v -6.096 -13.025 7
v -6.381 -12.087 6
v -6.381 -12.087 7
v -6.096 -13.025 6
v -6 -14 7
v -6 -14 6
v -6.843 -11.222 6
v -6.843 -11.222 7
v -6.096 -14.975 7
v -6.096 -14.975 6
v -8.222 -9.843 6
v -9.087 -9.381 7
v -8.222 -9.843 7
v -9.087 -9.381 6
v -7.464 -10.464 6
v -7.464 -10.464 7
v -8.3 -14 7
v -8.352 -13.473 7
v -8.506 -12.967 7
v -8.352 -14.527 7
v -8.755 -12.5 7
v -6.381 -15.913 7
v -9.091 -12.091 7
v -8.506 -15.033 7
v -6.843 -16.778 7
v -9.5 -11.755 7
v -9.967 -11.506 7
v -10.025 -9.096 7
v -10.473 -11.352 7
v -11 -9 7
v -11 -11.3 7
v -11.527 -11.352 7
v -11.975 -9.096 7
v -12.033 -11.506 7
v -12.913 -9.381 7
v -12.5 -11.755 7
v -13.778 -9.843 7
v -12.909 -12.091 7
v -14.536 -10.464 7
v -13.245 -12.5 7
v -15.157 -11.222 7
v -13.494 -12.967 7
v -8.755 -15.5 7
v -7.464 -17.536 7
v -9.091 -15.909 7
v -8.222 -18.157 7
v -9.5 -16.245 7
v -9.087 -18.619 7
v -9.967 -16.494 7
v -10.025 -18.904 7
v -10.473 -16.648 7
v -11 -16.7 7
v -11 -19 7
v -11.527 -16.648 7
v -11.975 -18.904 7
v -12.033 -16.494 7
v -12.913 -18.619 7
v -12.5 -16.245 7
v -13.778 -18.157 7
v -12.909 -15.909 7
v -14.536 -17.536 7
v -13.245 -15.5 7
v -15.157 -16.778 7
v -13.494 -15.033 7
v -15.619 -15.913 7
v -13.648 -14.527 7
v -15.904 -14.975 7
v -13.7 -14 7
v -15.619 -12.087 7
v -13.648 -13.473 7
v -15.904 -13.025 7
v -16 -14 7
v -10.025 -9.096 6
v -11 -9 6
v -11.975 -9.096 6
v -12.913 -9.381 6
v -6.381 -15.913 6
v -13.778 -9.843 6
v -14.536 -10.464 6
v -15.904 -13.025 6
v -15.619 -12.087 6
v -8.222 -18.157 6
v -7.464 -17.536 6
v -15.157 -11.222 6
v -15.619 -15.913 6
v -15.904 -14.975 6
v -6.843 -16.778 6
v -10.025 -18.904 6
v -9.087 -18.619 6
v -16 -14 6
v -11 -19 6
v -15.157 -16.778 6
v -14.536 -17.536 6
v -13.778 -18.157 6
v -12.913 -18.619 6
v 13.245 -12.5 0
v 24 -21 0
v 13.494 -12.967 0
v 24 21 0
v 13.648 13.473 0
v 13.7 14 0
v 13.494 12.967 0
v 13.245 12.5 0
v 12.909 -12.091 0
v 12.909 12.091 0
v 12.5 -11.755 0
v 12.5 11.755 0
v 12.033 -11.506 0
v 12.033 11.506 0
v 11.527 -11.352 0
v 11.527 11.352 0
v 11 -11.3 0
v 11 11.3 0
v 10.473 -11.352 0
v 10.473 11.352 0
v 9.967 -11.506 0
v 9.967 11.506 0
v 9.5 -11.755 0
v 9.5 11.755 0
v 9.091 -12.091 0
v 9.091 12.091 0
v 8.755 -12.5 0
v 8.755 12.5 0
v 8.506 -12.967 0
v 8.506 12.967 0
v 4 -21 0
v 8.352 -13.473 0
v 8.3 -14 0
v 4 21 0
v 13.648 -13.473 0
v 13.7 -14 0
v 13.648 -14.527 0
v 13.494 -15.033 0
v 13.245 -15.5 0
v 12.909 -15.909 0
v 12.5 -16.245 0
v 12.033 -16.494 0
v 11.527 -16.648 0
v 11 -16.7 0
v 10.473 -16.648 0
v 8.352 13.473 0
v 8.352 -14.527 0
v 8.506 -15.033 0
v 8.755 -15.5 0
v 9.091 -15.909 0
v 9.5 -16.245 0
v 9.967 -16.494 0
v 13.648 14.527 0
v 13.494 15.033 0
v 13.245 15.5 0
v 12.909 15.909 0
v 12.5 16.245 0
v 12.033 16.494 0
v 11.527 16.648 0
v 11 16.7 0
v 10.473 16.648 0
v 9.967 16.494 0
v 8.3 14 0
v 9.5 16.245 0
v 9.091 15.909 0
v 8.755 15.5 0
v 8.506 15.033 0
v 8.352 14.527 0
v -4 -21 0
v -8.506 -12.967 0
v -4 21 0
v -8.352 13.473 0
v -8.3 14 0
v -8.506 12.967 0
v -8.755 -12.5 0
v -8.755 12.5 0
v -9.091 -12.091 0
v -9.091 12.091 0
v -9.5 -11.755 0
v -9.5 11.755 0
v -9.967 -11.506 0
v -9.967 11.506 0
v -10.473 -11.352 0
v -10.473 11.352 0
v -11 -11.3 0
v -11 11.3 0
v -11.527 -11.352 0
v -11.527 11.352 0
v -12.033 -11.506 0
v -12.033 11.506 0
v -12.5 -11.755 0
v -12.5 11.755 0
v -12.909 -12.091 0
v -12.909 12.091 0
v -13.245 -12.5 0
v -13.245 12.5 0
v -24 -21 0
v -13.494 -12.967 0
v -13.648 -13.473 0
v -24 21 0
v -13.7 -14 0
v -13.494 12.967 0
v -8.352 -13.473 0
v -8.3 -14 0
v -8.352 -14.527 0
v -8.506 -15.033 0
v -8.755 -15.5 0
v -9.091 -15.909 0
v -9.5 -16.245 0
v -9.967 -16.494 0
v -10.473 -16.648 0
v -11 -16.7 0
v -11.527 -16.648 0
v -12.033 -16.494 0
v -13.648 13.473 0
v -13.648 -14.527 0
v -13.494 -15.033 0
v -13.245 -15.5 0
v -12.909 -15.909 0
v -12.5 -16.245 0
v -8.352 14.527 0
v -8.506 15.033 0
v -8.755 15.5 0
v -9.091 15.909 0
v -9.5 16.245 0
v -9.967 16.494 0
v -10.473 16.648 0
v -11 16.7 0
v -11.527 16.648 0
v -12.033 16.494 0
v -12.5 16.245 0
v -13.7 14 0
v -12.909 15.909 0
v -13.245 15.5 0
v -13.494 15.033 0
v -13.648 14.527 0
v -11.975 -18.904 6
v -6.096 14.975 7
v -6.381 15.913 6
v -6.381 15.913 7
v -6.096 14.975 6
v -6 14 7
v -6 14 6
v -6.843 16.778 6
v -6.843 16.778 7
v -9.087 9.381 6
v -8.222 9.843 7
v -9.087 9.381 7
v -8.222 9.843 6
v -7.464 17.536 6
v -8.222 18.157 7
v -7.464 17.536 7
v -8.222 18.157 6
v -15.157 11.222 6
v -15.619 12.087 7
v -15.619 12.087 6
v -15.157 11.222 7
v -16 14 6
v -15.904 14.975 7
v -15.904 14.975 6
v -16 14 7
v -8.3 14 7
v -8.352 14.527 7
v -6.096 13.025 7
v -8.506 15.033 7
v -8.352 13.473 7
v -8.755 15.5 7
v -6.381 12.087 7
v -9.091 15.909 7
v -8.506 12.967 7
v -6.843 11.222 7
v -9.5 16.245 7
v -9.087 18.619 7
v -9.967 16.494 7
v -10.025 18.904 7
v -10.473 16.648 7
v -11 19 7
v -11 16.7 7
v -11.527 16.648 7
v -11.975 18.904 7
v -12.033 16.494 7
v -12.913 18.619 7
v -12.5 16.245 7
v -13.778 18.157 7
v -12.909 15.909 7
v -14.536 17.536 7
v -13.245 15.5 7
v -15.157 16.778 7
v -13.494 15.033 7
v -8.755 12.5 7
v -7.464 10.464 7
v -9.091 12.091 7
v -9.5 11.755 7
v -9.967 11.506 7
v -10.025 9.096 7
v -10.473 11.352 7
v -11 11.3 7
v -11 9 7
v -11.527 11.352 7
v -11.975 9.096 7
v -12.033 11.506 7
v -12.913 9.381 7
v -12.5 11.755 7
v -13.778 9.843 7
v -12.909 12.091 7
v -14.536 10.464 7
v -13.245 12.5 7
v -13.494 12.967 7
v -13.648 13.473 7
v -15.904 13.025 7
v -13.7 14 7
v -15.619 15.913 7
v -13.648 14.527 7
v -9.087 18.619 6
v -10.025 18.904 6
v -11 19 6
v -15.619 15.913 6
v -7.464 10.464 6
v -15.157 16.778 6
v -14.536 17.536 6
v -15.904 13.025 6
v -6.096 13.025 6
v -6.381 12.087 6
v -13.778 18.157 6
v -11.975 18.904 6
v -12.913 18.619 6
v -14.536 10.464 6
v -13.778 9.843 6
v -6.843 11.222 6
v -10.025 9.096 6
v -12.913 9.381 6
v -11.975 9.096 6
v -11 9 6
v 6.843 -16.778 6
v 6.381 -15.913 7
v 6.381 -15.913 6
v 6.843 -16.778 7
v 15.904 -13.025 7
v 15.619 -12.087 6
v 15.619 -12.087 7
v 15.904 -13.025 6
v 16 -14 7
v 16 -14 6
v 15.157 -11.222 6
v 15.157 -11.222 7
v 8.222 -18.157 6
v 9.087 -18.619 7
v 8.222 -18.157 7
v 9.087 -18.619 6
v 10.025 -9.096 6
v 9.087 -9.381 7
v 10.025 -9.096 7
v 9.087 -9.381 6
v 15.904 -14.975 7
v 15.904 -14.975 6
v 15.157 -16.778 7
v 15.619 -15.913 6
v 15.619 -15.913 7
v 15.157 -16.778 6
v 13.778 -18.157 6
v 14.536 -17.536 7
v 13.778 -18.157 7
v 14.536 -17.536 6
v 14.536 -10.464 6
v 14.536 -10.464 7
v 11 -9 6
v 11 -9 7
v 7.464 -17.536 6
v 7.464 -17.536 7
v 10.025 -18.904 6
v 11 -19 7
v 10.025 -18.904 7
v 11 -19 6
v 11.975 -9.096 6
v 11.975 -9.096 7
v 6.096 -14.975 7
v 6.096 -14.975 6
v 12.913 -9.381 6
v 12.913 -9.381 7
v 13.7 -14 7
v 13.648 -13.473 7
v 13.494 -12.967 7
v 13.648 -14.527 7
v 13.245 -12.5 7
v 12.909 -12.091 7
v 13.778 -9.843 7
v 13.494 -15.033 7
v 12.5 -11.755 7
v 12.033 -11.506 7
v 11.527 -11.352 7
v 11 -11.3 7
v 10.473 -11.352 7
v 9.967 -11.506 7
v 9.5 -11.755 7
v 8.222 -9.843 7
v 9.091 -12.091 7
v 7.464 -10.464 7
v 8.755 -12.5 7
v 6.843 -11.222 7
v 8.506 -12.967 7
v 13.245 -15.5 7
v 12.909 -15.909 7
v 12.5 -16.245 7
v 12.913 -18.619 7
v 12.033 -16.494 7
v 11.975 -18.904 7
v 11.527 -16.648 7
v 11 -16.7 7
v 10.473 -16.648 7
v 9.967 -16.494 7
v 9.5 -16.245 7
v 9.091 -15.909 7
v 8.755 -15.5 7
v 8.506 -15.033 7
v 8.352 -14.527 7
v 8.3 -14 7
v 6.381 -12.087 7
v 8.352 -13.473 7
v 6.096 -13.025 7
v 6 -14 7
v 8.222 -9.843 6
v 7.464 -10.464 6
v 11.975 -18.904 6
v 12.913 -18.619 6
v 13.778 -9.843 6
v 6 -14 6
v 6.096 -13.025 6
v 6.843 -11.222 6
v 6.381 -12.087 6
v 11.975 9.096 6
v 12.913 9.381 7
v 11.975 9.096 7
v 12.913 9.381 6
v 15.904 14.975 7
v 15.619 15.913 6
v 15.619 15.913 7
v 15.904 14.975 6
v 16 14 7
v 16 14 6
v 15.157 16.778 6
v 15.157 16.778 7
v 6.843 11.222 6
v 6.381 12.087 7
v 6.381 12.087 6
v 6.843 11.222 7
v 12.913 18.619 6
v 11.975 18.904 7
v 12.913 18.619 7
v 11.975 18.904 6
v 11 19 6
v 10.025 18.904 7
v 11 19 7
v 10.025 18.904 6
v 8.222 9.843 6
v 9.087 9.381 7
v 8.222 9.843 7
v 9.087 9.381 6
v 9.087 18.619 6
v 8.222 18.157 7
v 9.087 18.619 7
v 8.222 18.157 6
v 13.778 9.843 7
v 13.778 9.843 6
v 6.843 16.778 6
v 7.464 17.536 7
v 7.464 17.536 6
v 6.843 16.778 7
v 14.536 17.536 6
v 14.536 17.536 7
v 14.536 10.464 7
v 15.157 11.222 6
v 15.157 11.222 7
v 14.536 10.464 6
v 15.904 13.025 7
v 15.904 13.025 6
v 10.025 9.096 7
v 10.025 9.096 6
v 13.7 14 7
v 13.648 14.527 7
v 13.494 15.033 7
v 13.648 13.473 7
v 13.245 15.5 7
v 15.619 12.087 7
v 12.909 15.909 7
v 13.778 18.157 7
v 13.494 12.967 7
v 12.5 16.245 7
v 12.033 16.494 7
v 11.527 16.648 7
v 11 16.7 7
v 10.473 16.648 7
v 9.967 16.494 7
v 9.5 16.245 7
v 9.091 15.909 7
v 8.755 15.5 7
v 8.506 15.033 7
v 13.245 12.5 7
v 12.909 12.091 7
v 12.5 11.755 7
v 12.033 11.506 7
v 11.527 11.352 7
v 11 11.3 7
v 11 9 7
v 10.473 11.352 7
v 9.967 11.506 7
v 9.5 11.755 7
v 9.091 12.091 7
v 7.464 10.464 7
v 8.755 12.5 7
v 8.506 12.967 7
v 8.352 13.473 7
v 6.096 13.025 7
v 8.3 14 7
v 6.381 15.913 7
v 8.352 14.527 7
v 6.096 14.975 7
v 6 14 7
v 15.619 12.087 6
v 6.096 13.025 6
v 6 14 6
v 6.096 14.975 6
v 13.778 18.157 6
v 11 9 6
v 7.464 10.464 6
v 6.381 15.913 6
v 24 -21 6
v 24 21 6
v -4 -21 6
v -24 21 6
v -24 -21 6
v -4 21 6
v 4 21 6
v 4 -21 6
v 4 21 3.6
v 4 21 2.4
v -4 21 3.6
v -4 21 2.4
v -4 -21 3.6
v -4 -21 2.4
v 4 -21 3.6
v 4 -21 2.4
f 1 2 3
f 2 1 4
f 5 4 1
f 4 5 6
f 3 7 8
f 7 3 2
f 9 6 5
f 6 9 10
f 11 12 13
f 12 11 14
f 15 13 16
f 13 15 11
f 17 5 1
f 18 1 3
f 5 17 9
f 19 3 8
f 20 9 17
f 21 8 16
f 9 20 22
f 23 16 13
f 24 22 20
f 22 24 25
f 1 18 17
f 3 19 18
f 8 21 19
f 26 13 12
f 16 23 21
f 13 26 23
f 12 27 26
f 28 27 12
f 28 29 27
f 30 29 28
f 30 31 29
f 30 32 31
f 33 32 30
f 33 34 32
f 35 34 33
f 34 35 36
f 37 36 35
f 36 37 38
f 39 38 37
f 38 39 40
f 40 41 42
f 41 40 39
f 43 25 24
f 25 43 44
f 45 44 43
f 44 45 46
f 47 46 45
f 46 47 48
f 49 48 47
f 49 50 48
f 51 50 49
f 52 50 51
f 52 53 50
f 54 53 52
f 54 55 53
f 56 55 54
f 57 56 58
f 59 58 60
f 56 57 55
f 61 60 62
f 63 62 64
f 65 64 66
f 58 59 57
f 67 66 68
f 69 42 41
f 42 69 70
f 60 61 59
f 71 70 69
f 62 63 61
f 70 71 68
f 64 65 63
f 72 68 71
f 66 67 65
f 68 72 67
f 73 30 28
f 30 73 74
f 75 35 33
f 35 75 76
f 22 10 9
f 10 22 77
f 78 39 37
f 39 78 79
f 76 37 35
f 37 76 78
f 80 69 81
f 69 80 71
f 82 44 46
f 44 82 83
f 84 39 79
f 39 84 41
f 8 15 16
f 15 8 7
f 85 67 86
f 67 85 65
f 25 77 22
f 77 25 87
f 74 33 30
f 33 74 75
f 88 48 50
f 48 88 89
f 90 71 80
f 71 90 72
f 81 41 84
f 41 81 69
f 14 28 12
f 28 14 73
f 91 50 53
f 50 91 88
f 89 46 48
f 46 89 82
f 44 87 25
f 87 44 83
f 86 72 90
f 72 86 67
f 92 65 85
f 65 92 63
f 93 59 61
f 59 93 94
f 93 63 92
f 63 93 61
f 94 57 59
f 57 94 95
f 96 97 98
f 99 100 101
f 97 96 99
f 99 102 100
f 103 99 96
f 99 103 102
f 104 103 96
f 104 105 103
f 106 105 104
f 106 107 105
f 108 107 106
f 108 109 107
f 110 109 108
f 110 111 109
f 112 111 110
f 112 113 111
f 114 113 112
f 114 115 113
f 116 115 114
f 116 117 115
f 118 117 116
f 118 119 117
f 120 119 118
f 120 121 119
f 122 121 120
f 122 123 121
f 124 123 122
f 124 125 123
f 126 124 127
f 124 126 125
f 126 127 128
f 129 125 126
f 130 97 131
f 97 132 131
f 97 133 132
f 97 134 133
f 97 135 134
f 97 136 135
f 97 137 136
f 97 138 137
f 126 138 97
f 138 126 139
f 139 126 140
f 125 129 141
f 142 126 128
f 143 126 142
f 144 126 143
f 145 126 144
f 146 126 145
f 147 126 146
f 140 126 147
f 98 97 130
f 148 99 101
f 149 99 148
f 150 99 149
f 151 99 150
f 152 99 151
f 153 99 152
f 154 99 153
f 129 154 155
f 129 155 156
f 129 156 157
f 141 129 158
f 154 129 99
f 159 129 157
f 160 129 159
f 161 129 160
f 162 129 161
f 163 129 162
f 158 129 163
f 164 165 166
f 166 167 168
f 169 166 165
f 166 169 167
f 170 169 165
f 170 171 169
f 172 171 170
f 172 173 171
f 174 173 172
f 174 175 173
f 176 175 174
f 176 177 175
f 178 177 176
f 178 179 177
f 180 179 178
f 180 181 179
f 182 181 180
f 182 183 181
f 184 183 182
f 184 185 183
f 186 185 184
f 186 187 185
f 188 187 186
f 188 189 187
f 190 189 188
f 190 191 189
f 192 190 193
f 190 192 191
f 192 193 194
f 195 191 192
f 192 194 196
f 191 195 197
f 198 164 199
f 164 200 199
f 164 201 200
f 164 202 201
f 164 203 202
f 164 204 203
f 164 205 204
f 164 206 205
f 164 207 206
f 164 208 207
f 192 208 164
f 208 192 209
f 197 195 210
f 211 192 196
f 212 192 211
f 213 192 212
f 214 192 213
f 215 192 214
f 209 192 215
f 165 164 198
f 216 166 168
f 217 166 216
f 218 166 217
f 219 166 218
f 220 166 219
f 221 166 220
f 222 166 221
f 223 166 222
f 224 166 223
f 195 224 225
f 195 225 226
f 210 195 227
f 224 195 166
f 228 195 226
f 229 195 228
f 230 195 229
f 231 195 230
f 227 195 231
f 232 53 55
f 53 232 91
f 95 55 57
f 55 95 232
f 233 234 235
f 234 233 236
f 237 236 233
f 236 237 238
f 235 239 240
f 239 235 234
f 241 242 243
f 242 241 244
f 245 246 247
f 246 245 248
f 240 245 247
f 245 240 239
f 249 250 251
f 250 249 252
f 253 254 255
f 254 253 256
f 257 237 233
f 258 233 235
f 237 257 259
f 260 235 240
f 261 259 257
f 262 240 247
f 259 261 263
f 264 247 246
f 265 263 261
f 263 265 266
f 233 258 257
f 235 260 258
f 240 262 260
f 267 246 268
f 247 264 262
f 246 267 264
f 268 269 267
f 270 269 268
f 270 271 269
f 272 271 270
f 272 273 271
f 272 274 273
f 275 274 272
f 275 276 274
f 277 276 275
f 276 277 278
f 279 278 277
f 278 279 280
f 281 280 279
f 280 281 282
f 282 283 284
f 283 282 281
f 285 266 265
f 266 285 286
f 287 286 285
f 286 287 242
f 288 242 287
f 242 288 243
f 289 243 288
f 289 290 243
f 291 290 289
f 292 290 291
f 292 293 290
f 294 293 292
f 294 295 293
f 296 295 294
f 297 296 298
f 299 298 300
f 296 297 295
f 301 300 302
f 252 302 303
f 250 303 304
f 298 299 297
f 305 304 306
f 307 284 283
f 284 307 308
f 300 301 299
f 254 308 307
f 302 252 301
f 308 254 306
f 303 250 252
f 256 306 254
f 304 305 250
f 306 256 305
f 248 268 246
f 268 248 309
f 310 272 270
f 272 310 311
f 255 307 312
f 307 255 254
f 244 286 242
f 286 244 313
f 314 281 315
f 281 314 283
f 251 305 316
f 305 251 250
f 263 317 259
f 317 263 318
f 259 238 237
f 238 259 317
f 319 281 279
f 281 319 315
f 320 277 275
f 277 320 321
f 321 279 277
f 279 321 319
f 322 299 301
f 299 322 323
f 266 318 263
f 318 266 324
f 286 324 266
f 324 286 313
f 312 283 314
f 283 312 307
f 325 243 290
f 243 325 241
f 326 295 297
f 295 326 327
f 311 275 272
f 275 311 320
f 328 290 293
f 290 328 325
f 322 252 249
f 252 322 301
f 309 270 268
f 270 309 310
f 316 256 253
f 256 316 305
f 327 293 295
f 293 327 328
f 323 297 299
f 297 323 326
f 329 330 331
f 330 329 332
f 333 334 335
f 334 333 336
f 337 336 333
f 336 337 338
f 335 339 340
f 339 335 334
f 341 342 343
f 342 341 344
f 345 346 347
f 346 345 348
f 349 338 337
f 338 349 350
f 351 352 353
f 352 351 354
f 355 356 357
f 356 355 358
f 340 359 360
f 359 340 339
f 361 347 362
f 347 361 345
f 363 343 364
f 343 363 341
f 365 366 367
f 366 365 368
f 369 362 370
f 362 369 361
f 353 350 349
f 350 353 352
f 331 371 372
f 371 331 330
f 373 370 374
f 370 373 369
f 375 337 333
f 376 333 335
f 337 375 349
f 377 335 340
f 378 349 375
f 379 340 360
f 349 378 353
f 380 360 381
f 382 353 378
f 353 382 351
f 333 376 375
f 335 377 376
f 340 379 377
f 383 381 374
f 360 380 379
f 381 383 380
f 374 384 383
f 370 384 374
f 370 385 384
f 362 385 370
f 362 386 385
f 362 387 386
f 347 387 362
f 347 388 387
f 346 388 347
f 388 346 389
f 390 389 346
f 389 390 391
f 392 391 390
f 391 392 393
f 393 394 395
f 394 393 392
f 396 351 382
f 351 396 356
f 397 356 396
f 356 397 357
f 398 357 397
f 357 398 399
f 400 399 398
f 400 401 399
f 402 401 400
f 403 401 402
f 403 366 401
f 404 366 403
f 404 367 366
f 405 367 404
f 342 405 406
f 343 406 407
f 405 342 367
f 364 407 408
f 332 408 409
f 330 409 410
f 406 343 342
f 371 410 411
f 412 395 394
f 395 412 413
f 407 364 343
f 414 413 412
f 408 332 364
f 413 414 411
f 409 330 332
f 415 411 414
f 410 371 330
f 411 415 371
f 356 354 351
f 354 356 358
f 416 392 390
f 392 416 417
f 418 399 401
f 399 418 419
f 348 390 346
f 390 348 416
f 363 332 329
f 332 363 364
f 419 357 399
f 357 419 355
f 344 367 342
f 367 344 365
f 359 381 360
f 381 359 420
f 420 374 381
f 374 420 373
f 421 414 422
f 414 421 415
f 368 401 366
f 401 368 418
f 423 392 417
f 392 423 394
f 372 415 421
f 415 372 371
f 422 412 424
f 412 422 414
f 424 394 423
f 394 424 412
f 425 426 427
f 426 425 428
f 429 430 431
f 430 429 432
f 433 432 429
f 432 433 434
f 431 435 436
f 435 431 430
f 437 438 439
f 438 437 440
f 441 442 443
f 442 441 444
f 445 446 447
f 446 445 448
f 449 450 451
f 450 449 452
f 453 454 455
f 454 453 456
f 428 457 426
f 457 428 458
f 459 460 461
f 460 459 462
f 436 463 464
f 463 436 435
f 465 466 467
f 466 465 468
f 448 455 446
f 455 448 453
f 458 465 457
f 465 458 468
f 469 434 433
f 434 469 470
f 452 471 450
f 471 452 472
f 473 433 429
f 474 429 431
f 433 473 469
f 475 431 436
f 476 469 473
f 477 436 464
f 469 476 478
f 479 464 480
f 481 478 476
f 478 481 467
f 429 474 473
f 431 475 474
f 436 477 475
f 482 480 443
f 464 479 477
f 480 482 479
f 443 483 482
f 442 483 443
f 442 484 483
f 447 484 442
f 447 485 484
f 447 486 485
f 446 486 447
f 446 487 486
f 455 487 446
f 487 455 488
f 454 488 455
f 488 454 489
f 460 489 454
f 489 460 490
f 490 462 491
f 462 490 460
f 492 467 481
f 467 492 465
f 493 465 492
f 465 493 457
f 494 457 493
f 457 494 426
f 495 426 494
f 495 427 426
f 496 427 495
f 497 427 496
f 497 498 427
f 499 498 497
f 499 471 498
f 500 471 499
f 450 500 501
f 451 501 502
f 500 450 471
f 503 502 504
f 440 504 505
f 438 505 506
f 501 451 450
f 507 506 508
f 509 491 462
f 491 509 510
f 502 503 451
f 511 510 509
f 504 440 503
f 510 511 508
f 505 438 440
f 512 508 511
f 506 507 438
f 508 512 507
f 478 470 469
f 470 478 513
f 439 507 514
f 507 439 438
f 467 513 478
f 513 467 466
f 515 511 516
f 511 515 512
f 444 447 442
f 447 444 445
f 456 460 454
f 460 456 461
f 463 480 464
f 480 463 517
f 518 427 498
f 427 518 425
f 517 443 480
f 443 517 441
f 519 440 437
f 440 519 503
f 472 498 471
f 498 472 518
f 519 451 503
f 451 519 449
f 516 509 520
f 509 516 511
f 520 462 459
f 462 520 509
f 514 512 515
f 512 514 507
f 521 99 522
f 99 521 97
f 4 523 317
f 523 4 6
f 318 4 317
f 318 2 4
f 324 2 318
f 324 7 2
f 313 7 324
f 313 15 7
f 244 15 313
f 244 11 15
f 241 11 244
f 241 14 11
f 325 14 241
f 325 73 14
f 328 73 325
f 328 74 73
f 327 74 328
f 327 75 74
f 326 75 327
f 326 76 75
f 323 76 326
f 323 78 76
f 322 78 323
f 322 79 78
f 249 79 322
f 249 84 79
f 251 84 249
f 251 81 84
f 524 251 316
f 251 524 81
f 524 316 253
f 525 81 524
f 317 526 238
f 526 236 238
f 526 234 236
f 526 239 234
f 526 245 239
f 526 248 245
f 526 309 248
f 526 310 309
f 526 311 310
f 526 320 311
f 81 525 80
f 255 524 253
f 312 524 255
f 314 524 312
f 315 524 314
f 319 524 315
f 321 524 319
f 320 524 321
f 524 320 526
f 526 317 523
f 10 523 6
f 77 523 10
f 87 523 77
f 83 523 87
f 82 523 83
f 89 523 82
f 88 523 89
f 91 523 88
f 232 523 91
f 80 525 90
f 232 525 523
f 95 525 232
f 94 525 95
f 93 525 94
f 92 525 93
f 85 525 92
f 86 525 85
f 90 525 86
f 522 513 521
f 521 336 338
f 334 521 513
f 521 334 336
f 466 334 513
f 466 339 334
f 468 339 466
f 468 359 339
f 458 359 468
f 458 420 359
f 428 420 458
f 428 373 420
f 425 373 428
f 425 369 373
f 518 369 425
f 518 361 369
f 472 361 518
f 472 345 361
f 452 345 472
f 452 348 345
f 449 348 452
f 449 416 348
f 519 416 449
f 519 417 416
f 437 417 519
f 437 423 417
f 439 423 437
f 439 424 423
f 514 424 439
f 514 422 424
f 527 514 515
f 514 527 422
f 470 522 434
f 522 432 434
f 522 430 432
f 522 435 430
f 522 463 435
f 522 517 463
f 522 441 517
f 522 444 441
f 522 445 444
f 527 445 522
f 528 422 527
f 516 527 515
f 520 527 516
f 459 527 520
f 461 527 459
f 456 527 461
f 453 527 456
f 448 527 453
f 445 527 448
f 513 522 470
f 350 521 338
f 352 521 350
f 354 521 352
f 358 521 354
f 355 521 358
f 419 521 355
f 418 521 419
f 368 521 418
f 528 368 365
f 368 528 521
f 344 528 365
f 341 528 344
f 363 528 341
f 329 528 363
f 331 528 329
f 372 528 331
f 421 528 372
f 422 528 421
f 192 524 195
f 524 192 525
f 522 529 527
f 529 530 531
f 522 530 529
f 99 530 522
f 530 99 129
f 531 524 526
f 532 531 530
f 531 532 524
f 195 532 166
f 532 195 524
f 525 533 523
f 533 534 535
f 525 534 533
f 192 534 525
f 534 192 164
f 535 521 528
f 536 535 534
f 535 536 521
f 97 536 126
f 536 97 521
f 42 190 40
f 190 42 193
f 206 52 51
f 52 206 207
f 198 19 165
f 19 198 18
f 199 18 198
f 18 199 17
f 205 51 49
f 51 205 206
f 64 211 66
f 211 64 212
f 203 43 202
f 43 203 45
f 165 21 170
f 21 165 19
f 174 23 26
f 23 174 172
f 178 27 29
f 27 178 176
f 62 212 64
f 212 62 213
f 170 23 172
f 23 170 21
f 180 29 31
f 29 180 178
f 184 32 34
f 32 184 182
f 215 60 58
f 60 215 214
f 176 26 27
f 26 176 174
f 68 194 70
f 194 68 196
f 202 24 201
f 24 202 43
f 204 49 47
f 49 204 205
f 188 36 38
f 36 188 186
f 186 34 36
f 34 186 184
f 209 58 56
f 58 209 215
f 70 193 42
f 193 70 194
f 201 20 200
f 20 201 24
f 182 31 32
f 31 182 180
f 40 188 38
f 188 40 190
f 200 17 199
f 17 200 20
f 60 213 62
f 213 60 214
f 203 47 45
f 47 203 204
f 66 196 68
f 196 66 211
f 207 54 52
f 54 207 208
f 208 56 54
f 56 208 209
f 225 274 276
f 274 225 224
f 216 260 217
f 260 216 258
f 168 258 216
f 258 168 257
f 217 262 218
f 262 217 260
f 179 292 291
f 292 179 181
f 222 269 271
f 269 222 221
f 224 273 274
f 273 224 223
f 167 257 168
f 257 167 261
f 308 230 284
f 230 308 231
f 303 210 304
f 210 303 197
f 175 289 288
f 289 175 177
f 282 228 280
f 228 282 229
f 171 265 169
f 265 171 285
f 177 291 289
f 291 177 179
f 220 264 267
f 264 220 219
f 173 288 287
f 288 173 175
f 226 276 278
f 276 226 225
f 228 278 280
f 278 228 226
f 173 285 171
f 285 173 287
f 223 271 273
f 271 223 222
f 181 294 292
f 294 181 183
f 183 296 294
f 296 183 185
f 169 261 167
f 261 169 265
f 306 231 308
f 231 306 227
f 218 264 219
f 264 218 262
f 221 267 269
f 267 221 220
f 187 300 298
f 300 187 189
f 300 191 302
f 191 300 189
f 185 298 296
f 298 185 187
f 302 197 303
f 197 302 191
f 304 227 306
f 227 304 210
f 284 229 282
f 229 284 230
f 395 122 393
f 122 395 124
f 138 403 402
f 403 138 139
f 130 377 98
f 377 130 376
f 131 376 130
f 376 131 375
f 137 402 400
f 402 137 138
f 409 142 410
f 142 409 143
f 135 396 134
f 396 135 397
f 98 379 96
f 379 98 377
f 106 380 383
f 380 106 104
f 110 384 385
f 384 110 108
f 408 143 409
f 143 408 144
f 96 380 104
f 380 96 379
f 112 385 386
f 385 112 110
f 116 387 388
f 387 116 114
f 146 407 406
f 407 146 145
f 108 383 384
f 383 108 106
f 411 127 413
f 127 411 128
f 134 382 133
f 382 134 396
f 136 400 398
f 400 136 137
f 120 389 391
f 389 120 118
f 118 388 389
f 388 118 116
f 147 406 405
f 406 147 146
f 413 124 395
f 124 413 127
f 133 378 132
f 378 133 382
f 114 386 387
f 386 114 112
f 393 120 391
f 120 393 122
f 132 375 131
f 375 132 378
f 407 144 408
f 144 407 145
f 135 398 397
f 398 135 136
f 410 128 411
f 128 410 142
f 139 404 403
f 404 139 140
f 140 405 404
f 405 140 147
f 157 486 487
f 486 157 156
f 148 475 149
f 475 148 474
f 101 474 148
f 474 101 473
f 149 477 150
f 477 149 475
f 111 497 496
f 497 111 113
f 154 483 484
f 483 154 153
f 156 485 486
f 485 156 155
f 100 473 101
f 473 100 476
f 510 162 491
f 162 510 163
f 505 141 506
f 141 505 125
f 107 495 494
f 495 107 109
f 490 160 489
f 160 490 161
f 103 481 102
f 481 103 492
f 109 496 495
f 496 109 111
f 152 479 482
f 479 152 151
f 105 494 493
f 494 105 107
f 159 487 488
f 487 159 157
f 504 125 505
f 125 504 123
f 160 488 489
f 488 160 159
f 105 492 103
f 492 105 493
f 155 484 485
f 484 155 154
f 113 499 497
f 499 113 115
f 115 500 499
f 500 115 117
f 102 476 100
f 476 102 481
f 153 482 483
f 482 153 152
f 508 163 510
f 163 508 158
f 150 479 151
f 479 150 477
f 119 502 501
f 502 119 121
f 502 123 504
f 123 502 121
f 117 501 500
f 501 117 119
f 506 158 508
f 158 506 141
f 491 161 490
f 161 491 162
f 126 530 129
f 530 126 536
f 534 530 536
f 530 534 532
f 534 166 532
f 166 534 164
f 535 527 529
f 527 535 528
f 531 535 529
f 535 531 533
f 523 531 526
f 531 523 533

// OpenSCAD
$fn = 32;

// ----------------------------------------------------------------------
// Living hinge: 48 x 42 mm plates, 1.2 mm flexible web
// ----------------------------------------------------------------------

// --- parameters (mm) ---
plate_len = 20;           // plate length outside the web
plate_w = 42;             // plate width
thick = 6;                // plate thickness
web_half = 4;             // half width of the flex band
web_t = 1.2;              // flexible web thickness
web_z = 2.4;              // web position inside the thickness
boss_d = 10;              // screw boss diameter
boss_h = 7;               // screw boss height
boss_x = 11;              // screw boss distance from the web
screw_d = 5.4;            // screw hole

difference() {
  union() {
    /* one flat strip, later thinned at the middle */
    translate([-24, -21, 0]) cube([48, 42, 6]);
    /* screw bosses, sunk 0.5 mm into the plates */
    for (sx = [-11, 11]) {
      for (sy = [-14, 14]) {
        translate([sx, sy, 0]) cylinder(h = boss_h, d = boss_d);
      }
    }
  }
  /* channel from below: leaves the web on top of it */
  translate([-4, -23.5, -2.5]) cube([8, 47, 4.9]);
  /* channel from above: thins the web down to web_t */
  translate([-4, -23.5, 3.6]) cube([8, 47, 4.9]);
  /* screw holes through the bosses */
  for (sx = [-11, 11]) {
    for (sy = [-14, 14]) {
      translate([sx, sy, -2.5]) cylinder(h = boss_h + 5, d = screw_d);
    }
  }
}
